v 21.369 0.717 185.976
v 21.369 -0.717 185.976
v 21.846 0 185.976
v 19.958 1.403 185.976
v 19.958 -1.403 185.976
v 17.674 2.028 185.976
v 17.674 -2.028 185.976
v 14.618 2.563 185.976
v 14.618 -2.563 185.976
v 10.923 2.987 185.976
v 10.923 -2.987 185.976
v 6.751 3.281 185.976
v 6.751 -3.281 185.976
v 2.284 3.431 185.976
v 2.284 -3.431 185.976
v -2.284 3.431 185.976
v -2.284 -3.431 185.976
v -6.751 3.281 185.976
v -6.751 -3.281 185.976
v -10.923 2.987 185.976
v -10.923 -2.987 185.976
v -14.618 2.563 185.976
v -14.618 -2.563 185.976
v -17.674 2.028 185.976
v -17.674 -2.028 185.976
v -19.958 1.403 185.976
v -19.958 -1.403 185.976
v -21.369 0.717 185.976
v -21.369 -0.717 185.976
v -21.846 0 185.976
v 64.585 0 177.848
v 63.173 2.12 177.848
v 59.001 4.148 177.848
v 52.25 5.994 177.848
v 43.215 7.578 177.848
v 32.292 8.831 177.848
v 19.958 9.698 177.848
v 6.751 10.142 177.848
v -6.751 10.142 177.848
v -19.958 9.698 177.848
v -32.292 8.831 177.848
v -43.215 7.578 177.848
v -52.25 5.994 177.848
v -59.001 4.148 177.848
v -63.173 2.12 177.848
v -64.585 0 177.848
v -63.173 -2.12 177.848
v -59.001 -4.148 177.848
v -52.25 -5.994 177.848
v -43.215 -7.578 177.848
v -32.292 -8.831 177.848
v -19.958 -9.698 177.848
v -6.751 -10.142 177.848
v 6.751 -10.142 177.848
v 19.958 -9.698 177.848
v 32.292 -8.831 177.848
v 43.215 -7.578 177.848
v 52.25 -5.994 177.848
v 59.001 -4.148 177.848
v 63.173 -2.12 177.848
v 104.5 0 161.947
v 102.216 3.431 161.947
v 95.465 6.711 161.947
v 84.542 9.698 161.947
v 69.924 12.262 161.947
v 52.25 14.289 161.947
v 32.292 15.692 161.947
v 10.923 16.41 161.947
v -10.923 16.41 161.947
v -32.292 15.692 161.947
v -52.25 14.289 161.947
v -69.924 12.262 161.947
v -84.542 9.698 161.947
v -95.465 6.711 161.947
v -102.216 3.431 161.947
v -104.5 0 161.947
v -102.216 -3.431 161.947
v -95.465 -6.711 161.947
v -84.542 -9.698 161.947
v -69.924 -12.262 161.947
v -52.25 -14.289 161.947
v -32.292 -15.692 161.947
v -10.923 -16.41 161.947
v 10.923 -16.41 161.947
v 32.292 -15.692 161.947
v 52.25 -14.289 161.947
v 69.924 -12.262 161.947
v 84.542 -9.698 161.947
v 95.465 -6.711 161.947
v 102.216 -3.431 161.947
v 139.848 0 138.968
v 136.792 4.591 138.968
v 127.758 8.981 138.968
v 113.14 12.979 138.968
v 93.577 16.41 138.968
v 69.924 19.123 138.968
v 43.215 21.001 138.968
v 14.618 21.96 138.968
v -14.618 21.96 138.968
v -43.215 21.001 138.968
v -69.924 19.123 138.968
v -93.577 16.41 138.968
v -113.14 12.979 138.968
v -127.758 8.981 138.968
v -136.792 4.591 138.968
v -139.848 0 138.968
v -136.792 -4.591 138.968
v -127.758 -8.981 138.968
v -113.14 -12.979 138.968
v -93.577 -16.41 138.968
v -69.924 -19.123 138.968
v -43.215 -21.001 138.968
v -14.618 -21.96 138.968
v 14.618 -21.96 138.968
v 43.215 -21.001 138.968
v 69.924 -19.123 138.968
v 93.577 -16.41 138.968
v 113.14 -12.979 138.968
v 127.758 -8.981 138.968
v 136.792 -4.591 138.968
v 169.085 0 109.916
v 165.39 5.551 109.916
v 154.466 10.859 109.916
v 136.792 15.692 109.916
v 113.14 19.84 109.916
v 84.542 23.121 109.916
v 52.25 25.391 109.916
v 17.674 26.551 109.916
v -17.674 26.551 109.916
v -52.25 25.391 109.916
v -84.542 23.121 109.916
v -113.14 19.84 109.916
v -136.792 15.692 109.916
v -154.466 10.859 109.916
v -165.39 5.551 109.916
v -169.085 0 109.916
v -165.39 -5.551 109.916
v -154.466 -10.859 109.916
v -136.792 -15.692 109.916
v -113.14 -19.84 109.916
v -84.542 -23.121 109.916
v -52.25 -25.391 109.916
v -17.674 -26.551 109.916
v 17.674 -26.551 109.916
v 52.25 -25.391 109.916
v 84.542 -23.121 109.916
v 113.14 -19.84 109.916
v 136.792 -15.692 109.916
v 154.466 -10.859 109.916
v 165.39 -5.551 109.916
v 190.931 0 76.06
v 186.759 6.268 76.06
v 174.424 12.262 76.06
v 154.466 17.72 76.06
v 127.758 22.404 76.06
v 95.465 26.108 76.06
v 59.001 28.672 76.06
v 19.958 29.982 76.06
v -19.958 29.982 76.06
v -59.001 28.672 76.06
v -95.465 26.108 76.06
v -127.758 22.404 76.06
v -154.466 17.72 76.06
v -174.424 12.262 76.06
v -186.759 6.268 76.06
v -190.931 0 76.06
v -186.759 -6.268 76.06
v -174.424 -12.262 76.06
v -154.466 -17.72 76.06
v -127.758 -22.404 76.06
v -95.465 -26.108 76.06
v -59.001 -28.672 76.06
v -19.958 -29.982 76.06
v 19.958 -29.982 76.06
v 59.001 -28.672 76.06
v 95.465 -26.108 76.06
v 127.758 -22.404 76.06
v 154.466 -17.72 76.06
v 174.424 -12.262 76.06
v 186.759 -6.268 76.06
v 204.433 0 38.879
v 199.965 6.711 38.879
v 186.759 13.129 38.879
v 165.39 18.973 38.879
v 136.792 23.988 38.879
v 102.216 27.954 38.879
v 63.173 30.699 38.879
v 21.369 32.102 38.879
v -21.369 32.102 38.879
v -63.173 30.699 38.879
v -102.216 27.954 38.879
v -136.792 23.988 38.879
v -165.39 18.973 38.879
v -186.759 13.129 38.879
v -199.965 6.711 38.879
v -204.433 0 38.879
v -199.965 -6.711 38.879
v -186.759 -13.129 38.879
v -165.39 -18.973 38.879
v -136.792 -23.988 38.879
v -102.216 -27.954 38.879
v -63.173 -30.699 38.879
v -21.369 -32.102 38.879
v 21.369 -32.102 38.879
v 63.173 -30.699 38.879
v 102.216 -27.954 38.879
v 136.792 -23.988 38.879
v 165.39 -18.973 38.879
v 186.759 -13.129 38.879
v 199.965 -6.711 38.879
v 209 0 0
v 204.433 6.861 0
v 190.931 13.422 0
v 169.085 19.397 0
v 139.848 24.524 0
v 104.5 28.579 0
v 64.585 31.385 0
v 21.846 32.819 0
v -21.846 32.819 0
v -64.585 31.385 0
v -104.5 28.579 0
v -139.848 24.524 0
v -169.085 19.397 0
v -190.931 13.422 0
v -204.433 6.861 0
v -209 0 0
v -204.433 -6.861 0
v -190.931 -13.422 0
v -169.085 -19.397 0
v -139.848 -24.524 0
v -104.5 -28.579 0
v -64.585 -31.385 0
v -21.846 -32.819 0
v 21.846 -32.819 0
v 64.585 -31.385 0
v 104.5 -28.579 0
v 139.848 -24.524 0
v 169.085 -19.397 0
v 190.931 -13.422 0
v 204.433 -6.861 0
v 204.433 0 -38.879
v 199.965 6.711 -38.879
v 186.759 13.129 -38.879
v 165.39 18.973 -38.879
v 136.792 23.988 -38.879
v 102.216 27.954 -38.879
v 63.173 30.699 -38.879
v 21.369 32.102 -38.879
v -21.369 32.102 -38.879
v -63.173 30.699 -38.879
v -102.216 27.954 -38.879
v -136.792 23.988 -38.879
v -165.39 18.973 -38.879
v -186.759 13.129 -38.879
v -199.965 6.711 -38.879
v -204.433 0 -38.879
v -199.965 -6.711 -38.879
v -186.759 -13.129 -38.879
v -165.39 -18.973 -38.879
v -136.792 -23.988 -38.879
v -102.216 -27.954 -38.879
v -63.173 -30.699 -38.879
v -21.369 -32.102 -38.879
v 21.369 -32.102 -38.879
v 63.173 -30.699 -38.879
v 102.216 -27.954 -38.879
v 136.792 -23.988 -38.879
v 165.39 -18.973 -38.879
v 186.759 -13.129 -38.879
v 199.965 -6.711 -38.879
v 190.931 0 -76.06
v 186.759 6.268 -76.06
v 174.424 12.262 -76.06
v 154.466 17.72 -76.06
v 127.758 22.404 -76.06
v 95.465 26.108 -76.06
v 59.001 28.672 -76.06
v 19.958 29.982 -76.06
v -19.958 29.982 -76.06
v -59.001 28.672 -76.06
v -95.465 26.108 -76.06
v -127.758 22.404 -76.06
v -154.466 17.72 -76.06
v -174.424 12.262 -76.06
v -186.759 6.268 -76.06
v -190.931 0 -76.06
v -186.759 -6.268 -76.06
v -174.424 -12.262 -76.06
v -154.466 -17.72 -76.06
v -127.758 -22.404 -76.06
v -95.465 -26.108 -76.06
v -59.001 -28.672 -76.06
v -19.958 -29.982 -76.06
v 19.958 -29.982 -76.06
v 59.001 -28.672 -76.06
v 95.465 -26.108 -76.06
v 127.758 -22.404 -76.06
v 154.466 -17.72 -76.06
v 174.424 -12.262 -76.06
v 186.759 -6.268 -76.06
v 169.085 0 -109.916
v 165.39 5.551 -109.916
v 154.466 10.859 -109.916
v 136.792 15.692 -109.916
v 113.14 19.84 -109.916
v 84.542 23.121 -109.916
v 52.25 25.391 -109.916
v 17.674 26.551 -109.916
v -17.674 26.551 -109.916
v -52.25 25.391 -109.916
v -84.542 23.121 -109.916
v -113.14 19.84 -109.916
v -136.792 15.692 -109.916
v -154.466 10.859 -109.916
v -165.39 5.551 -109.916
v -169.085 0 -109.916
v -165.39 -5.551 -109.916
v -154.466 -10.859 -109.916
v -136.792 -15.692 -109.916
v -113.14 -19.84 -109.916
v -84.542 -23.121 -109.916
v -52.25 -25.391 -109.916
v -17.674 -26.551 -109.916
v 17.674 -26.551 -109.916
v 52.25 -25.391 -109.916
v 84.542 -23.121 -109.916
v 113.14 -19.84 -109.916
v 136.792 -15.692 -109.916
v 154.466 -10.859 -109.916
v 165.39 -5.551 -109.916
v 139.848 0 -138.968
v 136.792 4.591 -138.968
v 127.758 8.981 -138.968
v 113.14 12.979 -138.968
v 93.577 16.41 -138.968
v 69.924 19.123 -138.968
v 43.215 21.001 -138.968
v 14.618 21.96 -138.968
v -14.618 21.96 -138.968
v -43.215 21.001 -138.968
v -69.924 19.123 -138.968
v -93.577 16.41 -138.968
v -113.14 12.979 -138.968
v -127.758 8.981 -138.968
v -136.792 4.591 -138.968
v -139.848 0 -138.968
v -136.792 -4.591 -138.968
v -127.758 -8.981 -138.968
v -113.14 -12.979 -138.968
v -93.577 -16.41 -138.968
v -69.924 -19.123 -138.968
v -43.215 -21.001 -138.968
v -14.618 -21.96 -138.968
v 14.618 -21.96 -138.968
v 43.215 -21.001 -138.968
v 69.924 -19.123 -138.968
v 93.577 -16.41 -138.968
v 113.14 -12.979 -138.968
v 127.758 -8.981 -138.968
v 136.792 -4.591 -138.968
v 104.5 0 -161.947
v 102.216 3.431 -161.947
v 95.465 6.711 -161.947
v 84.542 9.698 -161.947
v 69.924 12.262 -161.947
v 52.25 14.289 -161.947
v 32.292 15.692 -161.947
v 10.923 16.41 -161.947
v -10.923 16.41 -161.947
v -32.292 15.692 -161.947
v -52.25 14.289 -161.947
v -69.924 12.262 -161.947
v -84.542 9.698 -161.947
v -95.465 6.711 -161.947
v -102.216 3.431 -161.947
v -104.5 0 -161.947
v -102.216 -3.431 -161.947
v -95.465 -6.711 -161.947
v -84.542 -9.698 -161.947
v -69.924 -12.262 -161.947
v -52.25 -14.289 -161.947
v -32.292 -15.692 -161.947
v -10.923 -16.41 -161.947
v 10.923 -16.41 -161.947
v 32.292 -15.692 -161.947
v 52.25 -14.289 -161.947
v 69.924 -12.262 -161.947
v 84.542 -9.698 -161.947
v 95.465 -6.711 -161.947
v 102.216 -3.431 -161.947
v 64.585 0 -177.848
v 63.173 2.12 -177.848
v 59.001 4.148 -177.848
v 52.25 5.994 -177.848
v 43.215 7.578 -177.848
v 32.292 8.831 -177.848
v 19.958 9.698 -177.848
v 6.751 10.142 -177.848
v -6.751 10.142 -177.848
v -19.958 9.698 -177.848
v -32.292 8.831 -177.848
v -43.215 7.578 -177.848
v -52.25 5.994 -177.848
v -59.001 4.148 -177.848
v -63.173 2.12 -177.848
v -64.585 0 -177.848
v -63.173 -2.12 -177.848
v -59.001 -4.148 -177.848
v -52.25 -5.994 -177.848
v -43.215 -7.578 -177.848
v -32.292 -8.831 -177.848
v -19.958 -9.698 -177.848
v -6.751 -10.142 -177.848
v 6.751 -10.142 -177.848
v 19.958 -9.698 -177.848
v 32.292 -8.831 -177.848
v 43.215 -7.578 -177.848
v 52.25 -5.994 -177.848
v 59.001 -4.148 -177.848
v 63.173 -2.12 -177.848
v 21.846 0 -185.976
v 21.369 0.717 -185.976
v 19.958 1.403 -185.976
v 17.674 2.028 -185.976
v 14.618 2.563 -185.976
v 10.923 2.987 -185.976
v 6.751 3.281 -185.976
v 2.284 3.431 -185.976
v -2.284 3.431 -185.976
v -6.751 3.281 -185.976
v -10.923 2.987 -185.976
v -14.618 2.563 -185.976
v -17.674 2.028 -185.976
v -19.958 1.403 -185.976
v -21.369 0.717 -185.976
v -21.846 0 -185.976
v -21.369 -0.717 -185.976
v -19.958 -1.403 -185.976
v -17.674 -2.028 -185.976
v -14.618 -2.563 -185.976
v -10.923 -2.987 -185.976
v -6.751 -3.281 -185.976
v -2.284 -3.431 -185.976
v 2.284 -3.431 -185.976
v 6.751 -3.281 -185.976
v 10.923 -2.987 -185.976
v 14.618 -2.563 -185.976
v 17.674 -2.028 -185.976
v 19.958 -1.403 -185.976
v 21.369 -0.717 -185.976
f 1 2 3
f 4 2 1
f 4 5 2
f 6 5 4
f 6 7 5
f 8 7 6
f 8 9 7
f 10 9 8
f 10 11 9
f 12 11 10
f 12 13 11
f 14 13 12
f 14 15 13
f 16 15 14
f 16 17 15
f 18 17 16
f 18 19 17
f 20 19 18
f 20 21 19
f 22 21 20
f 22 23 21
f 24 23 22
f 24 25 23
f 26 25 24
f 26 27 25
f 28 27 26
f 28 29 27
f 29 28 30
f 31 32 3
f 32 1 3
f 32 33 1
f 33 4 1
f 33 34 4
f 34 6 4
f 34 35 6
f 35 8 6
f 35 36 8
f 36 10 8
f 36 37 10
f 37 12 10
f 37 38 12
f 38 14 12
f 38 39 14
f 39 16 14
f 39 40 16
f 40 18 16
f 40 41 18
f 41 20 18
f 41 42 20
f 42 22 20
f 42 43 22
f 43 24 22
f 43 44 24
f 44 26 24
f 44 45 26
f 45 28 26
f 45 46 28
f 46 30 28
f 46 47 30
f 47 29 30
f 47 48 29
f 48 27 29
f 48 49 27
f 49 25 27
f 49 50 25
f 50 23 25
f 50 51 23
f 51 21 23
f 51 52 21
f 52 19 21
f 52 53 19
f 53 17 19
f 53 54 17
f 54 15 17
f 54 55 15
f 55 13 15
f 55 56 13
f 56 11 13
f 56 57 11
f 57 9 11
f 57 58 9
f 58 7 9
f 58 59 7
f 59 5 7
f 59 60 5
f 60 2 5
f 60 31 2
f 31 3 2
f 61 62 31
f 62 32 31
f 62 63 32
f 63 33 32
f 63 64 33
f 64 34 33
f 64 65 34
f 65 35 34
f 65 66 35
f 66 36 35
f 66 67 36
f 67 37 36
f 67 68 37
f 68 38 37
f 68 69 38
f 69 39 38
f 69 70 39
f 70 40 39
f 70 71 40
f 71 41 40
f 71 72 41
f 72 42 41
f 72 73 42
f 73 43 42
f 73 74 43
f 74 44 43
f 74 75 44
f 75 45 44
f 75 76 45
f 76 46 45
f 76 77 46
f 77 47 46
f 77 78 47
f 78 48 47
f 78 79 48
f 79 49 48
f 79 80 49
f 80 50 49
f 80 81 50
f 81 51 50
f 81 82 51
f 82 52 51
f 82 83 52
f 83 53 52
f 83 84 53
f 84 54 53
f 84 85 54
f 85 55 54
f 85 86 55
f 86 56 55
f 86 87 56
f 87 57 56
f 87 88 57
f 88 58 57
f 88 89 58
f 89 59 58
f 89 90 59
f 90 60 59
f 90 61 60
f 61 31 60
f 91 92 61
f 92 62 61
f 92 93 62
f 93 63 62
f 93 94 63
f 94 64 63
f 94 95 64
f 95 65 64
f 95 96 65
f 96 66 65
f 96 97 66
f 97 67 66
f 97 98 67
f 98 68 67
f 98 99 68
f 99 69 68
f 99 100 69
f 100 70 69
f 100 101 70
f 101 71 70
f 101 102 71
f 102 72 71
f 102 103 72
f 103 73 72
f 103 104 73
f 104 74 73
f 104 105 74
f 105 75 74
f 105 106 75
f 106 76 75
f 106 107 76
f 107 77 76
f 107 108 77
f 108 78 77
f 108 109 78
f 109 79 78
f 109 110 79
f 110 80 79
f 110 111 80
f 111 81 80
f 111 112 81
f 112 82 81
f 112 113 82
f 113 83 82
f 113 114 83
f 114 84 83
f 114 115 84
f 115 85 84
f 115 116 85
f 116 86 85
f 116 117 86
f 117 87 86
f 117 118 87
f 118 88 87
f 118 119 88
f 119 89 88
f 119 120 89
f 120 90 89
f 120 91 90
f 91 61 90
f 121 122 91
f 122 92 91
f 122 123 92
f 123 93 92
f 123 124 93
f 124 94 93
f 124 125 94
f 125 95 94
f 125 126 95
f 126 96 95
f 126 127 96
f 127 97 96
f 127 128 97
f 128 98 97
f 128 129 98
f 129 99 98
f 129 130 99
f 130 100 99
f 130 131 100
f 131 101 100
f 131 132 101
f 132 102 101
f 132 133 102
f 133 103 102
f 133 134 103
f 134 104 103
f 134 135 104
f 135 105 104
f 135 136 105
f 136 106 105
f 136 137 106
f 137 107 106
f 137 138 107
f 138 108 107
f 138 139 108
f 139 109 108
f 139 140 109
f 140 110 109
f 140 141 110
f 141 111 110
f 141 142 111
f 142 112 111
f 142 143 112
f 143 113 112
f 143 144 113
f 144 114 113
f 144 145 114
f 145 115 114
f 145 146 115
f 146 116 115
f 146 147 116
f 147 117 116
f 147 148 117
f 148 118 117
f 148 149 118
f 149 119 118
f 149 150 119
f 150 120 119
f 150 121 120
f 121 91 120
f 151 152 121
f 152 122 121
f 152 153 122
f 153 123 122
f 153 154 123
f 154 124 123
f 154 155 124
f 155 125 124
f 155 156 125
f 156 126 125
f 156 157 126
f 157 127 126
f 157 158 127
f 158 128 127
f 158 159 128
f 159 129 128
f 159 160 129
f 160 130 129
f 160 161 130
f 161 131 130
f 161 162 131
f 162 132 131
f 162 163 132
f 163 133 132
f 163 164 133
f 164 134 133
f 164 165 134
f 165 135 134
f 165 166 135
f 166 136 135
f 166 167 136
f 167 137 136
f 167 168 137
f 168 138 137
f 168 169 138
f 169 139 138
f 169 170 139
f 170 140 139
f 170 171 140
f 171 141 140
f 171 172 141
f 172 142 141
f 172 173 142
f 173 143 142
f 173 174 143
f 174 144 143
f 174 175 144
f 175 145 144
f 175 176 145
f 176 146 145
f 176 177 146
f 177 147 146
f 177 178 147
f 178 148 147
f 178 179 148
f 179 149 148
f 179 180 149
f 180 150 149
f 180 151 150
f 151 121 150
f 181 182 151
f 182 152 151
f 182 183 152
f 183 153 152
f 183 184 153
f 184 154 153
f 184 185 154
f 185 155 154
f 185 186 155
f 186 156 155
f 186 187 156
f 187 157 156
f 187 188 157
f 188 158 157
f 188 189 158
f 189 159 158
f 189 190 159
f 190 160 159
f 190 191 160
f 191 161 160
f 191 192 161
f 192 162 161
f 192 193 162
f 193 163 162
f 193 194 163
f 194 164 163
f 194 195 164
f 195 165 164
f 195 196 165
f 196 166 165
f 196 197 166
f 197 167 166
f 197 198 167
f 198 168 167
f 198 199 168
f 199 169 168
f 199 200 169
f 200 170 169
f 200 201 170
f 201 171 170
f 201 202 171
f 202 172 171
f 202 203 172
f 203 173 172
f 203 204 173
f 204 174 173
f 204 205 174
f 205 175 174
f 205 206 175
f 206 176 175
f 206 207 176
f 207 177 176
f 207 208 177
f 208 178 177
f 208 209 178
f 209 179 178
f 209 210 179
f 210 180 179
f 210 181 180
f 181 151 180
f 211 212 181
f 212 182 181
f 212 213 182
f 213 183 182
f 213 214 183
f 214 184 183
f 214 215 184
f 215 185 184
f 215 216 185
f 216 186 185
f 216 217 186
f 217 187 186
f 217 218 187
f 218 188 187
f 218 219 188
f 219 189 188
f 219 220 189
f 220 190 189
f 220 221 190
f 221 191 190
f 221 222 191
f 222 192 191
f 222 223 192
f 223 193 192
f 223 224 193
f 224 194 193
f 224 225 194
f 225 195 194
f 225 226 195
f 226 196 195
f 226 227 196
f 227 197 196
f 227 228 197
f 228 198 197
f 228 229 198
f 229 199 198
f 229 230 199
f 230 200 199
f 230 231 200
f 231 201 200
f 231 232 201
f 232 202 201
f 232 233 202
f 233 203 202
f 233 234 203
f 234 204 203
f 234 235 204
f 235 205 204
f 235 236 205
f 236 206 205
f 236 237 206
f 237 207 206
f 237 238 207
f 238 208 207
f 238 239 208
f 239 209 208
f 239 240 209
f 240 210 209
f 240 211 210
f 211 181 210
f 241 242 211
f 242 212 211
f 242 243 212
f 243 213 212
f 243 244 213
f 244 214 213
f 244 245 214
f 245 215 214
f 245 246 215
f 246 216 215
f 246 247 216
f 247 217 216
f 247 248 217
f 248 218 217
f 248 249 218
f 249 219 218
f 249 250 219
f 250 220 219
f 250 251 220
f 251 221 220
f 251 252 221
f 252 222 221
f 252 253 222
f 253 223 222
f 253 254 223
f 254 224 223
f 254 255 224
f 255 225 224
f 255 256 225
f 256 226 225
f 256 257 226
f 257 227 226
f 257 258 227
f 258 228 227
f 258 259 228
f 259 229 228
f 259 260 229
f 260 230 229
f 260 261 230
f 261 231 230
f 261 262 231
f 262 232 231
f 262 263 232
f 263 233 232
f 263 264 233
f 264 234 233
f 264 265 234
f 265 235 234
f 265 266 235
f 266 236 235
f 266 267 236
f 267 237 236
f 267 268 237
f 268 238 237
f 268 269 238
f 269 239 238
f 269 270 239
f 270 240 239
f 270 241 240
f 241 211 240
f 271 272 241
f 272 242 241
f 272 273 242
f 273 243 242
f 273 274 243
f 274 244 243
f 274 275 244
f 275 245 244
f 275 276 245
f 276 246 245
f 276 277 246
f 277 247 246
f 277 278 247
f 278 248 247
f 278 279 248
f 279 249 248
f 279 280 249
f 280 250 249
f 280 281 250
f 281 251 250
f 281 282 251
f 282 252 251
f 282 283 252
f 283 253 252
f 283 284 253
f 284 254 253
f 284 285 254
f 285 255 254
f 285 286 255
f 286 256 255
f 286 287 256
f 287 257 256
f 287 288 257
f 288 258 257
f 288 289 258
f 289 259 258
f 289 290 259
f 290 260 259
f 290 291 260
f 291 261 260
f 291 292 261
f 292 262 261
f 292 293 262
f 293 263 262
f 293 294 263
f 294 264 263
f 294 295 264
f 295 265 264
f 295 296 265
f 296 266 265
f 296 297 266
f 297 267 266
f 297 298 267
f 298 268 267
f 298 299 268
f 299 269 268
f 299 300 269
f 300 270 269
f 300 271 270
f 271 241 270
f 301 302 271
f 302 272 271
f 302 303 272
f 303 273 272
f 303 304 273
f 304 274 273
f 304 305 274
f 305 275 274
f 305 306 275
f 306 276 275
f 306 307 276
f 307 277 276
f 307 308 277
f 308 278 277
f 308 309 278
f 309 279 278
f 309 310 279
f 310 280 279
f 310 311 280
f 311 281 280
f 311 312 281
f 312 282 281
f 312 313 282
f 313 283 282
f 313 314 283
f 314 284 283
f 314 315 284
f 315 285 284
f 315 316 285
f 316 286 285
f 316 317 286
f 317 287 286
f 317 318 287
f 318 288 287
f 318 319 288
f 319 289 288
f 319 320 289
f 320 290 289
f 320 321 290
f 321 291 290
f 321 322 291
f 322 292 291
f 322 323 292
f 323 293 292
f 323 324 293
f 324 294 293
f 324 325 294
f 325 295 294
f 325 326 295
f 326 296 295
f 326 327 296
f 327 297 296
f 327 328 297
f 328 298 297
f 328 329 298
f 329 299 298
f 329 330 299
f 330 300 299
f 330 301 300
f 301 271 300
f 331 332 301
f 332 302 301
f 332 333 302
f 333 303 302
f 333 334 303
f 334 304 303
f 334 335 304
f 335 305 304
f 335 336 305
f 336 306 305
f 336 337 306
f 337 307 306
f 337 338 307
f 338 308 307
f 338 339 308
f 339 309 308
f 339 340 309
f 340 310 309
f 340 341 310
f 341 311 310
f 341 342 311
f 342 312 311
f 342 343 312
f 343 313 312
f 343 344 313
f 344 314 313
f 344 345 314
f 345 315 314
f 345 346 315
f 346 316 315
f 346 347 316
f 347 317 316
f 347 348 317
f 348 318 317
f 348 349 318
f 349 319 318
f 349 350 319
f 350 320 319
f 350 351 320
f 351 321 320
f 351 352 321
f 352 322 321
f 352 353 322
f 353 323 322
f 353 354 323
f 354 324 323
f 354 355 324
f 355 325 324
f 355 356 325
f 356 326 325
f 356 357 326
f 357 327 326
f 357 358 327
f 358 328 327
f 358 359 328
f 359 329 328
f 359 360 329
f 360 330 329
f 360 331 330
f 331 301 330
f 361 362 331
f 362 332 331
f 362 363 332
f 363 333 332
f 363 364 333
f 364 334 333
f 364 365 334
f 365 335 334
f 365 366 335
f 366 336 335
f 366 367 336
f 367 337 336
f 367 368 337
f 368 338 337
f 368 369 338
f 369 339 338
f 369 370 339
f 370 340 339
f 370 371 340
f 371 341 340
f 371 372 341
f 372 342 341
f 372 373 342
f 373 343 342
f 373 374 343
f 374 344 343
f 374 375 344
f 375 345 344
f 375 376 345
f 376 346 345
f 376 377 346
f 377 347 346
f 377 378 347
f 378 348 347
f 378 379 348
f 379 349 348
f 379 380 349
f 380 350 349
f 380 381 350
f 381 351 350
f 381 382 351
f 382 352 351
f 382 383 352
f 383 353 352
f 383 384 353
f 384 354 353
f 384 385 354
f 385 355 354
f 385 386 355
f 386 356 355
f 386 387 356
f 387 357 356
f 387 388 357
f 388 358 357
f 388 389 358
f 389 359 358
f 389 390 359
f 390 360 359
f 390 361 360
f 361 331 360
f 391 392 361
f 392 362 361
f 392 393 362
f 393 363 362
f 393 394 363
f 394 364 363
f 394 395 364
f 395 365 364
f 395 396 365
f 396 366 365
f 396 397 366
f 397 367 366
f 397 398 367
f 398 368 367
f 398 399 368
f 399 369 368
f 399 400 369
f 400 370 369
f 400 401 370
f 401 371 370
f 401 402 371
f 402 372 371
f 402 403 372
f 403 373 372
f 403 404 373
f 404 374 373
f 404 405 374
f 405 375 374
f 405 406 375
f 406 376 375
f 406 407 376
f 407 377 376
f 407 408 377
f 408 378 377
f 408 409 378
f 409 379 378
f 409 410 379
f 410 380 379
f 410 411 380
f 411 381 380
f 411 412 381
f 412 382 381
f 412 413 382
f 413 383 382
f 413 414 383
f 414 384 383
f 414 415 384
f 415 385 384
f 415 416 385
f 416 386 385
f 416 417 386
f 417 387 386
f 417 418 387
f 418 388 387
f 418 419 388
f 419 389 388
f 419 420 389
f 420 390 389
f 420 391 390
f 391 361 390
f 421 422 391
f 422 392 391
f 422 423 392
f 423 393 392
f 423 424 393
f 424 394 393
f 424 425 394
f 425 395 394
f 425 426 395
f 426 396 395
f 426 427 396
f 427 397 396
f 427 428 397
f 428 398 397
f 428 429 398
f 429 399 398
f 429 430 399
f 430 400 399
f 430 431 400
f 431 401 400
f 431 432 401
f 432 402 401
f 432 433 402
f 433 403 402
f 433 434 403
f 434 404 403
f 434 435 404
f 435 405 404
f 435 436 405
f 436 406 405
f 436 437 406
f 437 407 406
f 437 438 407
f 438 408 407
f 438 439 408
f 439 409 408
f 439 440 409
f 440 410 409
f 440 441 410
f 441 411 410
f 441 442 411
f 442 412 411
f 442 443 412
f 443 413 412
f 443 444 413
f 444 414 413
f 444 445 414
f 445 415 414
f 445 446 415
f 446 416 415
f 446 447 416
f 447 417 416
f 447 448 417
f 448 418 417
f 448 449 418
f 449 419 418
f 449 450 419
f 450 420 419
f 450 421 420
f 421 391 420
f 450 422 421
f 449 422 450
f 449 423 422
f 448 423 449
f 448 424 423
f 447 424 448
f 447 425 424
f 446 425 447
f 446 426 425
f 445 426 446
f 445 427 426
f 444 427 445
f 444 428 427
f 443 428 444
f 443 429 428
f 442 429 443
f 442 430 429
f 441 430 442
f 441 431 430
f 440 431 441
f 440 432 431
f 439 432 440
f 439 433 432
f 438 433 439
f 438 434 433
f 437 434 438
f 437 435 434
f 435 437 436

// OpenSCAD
// Generated by SolidPython 1.0.1 on 2020-07-29 00:46:53


scale(v = [19, 3, 17]) {
	sphere(r = 11);
}
/***********************************************
*********      SolidPython code:      **********
************************************************
 
# import packages: SolidPython
from solid import *
from solid.utils import *
from itertools import chain, combinations, permutations


class Resize:

    def __init__(self, scad_file):
        self.scad_file = scad_file
        #self.scad_file = import_scad(scad_file)
        # cone/cylinder param:
        self.r1 = 0
        self.r2 = 0
        self.h = 0
        # rectangular prism param:
        self.w = 0
        self.l = 0
        # ellipse param:
        self.r = 0

    # import OpenScad code (file name corresponds to shape)


    # classify shape + parameters
    def assign(self, param1, param2, param3):
        if self.scad_file == 'cone.scad':
            self.r1 = param1
            self.r2 = param2
            self.h = param3
        elif self.scad_file == 'cylinder.scad':
            self.r1 = param1
            self.r2 = param2
            self.h = param3
        elif self.scad_file == 'rectangularPrism.scad':
            self.h = param1
            self.l = param2
            self.w = param3
        else:
            self.r = param1
            self.h = param2

    # resize parameters
    def iterate(self):
        x = range(3, 20, 2)
        i = 1
        if self.scad_file == 'cone.scad':
            tempList = list(permutations(x, 2))
            for temp in tempList:
                param1 = temp[0]
                param2 = temp[1]
                filepath = 'produced_scad_files/' + 'cone' + str(param1) + '_' + str(param2) + '_' + '.scad'
                scad_render_to_file(cylinder(h=param1, r1=param2, r2=0), filepath)

        elif self.scad_file == 'cylinder.scad':
            tempList = list(permutations(x, 3))
            for temp in tempList:
                param1 = temp[0]
                param2 = temp[1]
                filepath = 'produced_scad_files/' + 'cylinder' + str(param1) + '_' + str(param2) + '_' + '.scad'
                scad_render_to_file(cylinder(h=param1, r1=param2, r2=param2), filepath)

        elif self.scad_file == 'rectangularPrism.scad':
            tempList = list(permutations(x, 3))
            for temp in tempList:
                param1 = temp[0]
                param2 = temp[1]
                param3 = temp[2]
                filepath = 'produced_scad_files/' + 'rectangularPrism' + str(param1) + '_' + str(param2) + '_' + str(
                    param3) + '.scad'
                scad_render_to_file(cube(size=(param1, param2, param3)), filepath)

        elif self.scad_file == 'ellipse.scad':
            tempList = list(permutations(x, 4))
            for temp in tempList:
                param1 = temp[0]
                param2 = temp[1]
                param3 = temp[2]
                param4 = temp[3]
                filepath = 'produced_scad_files/' + 'ellipse' + str(param1) + '_' + str(param2) + '_' + str(param3) + '_' + str(param4) + '.scad'
                scad_render_to_file(scale([param1, param2, param3])(sphere(r=param4)), filepath)

    def render_to_scadfile(self):
        scad_render_to_file(scad, 'example.scad') 
 
************************************************/
